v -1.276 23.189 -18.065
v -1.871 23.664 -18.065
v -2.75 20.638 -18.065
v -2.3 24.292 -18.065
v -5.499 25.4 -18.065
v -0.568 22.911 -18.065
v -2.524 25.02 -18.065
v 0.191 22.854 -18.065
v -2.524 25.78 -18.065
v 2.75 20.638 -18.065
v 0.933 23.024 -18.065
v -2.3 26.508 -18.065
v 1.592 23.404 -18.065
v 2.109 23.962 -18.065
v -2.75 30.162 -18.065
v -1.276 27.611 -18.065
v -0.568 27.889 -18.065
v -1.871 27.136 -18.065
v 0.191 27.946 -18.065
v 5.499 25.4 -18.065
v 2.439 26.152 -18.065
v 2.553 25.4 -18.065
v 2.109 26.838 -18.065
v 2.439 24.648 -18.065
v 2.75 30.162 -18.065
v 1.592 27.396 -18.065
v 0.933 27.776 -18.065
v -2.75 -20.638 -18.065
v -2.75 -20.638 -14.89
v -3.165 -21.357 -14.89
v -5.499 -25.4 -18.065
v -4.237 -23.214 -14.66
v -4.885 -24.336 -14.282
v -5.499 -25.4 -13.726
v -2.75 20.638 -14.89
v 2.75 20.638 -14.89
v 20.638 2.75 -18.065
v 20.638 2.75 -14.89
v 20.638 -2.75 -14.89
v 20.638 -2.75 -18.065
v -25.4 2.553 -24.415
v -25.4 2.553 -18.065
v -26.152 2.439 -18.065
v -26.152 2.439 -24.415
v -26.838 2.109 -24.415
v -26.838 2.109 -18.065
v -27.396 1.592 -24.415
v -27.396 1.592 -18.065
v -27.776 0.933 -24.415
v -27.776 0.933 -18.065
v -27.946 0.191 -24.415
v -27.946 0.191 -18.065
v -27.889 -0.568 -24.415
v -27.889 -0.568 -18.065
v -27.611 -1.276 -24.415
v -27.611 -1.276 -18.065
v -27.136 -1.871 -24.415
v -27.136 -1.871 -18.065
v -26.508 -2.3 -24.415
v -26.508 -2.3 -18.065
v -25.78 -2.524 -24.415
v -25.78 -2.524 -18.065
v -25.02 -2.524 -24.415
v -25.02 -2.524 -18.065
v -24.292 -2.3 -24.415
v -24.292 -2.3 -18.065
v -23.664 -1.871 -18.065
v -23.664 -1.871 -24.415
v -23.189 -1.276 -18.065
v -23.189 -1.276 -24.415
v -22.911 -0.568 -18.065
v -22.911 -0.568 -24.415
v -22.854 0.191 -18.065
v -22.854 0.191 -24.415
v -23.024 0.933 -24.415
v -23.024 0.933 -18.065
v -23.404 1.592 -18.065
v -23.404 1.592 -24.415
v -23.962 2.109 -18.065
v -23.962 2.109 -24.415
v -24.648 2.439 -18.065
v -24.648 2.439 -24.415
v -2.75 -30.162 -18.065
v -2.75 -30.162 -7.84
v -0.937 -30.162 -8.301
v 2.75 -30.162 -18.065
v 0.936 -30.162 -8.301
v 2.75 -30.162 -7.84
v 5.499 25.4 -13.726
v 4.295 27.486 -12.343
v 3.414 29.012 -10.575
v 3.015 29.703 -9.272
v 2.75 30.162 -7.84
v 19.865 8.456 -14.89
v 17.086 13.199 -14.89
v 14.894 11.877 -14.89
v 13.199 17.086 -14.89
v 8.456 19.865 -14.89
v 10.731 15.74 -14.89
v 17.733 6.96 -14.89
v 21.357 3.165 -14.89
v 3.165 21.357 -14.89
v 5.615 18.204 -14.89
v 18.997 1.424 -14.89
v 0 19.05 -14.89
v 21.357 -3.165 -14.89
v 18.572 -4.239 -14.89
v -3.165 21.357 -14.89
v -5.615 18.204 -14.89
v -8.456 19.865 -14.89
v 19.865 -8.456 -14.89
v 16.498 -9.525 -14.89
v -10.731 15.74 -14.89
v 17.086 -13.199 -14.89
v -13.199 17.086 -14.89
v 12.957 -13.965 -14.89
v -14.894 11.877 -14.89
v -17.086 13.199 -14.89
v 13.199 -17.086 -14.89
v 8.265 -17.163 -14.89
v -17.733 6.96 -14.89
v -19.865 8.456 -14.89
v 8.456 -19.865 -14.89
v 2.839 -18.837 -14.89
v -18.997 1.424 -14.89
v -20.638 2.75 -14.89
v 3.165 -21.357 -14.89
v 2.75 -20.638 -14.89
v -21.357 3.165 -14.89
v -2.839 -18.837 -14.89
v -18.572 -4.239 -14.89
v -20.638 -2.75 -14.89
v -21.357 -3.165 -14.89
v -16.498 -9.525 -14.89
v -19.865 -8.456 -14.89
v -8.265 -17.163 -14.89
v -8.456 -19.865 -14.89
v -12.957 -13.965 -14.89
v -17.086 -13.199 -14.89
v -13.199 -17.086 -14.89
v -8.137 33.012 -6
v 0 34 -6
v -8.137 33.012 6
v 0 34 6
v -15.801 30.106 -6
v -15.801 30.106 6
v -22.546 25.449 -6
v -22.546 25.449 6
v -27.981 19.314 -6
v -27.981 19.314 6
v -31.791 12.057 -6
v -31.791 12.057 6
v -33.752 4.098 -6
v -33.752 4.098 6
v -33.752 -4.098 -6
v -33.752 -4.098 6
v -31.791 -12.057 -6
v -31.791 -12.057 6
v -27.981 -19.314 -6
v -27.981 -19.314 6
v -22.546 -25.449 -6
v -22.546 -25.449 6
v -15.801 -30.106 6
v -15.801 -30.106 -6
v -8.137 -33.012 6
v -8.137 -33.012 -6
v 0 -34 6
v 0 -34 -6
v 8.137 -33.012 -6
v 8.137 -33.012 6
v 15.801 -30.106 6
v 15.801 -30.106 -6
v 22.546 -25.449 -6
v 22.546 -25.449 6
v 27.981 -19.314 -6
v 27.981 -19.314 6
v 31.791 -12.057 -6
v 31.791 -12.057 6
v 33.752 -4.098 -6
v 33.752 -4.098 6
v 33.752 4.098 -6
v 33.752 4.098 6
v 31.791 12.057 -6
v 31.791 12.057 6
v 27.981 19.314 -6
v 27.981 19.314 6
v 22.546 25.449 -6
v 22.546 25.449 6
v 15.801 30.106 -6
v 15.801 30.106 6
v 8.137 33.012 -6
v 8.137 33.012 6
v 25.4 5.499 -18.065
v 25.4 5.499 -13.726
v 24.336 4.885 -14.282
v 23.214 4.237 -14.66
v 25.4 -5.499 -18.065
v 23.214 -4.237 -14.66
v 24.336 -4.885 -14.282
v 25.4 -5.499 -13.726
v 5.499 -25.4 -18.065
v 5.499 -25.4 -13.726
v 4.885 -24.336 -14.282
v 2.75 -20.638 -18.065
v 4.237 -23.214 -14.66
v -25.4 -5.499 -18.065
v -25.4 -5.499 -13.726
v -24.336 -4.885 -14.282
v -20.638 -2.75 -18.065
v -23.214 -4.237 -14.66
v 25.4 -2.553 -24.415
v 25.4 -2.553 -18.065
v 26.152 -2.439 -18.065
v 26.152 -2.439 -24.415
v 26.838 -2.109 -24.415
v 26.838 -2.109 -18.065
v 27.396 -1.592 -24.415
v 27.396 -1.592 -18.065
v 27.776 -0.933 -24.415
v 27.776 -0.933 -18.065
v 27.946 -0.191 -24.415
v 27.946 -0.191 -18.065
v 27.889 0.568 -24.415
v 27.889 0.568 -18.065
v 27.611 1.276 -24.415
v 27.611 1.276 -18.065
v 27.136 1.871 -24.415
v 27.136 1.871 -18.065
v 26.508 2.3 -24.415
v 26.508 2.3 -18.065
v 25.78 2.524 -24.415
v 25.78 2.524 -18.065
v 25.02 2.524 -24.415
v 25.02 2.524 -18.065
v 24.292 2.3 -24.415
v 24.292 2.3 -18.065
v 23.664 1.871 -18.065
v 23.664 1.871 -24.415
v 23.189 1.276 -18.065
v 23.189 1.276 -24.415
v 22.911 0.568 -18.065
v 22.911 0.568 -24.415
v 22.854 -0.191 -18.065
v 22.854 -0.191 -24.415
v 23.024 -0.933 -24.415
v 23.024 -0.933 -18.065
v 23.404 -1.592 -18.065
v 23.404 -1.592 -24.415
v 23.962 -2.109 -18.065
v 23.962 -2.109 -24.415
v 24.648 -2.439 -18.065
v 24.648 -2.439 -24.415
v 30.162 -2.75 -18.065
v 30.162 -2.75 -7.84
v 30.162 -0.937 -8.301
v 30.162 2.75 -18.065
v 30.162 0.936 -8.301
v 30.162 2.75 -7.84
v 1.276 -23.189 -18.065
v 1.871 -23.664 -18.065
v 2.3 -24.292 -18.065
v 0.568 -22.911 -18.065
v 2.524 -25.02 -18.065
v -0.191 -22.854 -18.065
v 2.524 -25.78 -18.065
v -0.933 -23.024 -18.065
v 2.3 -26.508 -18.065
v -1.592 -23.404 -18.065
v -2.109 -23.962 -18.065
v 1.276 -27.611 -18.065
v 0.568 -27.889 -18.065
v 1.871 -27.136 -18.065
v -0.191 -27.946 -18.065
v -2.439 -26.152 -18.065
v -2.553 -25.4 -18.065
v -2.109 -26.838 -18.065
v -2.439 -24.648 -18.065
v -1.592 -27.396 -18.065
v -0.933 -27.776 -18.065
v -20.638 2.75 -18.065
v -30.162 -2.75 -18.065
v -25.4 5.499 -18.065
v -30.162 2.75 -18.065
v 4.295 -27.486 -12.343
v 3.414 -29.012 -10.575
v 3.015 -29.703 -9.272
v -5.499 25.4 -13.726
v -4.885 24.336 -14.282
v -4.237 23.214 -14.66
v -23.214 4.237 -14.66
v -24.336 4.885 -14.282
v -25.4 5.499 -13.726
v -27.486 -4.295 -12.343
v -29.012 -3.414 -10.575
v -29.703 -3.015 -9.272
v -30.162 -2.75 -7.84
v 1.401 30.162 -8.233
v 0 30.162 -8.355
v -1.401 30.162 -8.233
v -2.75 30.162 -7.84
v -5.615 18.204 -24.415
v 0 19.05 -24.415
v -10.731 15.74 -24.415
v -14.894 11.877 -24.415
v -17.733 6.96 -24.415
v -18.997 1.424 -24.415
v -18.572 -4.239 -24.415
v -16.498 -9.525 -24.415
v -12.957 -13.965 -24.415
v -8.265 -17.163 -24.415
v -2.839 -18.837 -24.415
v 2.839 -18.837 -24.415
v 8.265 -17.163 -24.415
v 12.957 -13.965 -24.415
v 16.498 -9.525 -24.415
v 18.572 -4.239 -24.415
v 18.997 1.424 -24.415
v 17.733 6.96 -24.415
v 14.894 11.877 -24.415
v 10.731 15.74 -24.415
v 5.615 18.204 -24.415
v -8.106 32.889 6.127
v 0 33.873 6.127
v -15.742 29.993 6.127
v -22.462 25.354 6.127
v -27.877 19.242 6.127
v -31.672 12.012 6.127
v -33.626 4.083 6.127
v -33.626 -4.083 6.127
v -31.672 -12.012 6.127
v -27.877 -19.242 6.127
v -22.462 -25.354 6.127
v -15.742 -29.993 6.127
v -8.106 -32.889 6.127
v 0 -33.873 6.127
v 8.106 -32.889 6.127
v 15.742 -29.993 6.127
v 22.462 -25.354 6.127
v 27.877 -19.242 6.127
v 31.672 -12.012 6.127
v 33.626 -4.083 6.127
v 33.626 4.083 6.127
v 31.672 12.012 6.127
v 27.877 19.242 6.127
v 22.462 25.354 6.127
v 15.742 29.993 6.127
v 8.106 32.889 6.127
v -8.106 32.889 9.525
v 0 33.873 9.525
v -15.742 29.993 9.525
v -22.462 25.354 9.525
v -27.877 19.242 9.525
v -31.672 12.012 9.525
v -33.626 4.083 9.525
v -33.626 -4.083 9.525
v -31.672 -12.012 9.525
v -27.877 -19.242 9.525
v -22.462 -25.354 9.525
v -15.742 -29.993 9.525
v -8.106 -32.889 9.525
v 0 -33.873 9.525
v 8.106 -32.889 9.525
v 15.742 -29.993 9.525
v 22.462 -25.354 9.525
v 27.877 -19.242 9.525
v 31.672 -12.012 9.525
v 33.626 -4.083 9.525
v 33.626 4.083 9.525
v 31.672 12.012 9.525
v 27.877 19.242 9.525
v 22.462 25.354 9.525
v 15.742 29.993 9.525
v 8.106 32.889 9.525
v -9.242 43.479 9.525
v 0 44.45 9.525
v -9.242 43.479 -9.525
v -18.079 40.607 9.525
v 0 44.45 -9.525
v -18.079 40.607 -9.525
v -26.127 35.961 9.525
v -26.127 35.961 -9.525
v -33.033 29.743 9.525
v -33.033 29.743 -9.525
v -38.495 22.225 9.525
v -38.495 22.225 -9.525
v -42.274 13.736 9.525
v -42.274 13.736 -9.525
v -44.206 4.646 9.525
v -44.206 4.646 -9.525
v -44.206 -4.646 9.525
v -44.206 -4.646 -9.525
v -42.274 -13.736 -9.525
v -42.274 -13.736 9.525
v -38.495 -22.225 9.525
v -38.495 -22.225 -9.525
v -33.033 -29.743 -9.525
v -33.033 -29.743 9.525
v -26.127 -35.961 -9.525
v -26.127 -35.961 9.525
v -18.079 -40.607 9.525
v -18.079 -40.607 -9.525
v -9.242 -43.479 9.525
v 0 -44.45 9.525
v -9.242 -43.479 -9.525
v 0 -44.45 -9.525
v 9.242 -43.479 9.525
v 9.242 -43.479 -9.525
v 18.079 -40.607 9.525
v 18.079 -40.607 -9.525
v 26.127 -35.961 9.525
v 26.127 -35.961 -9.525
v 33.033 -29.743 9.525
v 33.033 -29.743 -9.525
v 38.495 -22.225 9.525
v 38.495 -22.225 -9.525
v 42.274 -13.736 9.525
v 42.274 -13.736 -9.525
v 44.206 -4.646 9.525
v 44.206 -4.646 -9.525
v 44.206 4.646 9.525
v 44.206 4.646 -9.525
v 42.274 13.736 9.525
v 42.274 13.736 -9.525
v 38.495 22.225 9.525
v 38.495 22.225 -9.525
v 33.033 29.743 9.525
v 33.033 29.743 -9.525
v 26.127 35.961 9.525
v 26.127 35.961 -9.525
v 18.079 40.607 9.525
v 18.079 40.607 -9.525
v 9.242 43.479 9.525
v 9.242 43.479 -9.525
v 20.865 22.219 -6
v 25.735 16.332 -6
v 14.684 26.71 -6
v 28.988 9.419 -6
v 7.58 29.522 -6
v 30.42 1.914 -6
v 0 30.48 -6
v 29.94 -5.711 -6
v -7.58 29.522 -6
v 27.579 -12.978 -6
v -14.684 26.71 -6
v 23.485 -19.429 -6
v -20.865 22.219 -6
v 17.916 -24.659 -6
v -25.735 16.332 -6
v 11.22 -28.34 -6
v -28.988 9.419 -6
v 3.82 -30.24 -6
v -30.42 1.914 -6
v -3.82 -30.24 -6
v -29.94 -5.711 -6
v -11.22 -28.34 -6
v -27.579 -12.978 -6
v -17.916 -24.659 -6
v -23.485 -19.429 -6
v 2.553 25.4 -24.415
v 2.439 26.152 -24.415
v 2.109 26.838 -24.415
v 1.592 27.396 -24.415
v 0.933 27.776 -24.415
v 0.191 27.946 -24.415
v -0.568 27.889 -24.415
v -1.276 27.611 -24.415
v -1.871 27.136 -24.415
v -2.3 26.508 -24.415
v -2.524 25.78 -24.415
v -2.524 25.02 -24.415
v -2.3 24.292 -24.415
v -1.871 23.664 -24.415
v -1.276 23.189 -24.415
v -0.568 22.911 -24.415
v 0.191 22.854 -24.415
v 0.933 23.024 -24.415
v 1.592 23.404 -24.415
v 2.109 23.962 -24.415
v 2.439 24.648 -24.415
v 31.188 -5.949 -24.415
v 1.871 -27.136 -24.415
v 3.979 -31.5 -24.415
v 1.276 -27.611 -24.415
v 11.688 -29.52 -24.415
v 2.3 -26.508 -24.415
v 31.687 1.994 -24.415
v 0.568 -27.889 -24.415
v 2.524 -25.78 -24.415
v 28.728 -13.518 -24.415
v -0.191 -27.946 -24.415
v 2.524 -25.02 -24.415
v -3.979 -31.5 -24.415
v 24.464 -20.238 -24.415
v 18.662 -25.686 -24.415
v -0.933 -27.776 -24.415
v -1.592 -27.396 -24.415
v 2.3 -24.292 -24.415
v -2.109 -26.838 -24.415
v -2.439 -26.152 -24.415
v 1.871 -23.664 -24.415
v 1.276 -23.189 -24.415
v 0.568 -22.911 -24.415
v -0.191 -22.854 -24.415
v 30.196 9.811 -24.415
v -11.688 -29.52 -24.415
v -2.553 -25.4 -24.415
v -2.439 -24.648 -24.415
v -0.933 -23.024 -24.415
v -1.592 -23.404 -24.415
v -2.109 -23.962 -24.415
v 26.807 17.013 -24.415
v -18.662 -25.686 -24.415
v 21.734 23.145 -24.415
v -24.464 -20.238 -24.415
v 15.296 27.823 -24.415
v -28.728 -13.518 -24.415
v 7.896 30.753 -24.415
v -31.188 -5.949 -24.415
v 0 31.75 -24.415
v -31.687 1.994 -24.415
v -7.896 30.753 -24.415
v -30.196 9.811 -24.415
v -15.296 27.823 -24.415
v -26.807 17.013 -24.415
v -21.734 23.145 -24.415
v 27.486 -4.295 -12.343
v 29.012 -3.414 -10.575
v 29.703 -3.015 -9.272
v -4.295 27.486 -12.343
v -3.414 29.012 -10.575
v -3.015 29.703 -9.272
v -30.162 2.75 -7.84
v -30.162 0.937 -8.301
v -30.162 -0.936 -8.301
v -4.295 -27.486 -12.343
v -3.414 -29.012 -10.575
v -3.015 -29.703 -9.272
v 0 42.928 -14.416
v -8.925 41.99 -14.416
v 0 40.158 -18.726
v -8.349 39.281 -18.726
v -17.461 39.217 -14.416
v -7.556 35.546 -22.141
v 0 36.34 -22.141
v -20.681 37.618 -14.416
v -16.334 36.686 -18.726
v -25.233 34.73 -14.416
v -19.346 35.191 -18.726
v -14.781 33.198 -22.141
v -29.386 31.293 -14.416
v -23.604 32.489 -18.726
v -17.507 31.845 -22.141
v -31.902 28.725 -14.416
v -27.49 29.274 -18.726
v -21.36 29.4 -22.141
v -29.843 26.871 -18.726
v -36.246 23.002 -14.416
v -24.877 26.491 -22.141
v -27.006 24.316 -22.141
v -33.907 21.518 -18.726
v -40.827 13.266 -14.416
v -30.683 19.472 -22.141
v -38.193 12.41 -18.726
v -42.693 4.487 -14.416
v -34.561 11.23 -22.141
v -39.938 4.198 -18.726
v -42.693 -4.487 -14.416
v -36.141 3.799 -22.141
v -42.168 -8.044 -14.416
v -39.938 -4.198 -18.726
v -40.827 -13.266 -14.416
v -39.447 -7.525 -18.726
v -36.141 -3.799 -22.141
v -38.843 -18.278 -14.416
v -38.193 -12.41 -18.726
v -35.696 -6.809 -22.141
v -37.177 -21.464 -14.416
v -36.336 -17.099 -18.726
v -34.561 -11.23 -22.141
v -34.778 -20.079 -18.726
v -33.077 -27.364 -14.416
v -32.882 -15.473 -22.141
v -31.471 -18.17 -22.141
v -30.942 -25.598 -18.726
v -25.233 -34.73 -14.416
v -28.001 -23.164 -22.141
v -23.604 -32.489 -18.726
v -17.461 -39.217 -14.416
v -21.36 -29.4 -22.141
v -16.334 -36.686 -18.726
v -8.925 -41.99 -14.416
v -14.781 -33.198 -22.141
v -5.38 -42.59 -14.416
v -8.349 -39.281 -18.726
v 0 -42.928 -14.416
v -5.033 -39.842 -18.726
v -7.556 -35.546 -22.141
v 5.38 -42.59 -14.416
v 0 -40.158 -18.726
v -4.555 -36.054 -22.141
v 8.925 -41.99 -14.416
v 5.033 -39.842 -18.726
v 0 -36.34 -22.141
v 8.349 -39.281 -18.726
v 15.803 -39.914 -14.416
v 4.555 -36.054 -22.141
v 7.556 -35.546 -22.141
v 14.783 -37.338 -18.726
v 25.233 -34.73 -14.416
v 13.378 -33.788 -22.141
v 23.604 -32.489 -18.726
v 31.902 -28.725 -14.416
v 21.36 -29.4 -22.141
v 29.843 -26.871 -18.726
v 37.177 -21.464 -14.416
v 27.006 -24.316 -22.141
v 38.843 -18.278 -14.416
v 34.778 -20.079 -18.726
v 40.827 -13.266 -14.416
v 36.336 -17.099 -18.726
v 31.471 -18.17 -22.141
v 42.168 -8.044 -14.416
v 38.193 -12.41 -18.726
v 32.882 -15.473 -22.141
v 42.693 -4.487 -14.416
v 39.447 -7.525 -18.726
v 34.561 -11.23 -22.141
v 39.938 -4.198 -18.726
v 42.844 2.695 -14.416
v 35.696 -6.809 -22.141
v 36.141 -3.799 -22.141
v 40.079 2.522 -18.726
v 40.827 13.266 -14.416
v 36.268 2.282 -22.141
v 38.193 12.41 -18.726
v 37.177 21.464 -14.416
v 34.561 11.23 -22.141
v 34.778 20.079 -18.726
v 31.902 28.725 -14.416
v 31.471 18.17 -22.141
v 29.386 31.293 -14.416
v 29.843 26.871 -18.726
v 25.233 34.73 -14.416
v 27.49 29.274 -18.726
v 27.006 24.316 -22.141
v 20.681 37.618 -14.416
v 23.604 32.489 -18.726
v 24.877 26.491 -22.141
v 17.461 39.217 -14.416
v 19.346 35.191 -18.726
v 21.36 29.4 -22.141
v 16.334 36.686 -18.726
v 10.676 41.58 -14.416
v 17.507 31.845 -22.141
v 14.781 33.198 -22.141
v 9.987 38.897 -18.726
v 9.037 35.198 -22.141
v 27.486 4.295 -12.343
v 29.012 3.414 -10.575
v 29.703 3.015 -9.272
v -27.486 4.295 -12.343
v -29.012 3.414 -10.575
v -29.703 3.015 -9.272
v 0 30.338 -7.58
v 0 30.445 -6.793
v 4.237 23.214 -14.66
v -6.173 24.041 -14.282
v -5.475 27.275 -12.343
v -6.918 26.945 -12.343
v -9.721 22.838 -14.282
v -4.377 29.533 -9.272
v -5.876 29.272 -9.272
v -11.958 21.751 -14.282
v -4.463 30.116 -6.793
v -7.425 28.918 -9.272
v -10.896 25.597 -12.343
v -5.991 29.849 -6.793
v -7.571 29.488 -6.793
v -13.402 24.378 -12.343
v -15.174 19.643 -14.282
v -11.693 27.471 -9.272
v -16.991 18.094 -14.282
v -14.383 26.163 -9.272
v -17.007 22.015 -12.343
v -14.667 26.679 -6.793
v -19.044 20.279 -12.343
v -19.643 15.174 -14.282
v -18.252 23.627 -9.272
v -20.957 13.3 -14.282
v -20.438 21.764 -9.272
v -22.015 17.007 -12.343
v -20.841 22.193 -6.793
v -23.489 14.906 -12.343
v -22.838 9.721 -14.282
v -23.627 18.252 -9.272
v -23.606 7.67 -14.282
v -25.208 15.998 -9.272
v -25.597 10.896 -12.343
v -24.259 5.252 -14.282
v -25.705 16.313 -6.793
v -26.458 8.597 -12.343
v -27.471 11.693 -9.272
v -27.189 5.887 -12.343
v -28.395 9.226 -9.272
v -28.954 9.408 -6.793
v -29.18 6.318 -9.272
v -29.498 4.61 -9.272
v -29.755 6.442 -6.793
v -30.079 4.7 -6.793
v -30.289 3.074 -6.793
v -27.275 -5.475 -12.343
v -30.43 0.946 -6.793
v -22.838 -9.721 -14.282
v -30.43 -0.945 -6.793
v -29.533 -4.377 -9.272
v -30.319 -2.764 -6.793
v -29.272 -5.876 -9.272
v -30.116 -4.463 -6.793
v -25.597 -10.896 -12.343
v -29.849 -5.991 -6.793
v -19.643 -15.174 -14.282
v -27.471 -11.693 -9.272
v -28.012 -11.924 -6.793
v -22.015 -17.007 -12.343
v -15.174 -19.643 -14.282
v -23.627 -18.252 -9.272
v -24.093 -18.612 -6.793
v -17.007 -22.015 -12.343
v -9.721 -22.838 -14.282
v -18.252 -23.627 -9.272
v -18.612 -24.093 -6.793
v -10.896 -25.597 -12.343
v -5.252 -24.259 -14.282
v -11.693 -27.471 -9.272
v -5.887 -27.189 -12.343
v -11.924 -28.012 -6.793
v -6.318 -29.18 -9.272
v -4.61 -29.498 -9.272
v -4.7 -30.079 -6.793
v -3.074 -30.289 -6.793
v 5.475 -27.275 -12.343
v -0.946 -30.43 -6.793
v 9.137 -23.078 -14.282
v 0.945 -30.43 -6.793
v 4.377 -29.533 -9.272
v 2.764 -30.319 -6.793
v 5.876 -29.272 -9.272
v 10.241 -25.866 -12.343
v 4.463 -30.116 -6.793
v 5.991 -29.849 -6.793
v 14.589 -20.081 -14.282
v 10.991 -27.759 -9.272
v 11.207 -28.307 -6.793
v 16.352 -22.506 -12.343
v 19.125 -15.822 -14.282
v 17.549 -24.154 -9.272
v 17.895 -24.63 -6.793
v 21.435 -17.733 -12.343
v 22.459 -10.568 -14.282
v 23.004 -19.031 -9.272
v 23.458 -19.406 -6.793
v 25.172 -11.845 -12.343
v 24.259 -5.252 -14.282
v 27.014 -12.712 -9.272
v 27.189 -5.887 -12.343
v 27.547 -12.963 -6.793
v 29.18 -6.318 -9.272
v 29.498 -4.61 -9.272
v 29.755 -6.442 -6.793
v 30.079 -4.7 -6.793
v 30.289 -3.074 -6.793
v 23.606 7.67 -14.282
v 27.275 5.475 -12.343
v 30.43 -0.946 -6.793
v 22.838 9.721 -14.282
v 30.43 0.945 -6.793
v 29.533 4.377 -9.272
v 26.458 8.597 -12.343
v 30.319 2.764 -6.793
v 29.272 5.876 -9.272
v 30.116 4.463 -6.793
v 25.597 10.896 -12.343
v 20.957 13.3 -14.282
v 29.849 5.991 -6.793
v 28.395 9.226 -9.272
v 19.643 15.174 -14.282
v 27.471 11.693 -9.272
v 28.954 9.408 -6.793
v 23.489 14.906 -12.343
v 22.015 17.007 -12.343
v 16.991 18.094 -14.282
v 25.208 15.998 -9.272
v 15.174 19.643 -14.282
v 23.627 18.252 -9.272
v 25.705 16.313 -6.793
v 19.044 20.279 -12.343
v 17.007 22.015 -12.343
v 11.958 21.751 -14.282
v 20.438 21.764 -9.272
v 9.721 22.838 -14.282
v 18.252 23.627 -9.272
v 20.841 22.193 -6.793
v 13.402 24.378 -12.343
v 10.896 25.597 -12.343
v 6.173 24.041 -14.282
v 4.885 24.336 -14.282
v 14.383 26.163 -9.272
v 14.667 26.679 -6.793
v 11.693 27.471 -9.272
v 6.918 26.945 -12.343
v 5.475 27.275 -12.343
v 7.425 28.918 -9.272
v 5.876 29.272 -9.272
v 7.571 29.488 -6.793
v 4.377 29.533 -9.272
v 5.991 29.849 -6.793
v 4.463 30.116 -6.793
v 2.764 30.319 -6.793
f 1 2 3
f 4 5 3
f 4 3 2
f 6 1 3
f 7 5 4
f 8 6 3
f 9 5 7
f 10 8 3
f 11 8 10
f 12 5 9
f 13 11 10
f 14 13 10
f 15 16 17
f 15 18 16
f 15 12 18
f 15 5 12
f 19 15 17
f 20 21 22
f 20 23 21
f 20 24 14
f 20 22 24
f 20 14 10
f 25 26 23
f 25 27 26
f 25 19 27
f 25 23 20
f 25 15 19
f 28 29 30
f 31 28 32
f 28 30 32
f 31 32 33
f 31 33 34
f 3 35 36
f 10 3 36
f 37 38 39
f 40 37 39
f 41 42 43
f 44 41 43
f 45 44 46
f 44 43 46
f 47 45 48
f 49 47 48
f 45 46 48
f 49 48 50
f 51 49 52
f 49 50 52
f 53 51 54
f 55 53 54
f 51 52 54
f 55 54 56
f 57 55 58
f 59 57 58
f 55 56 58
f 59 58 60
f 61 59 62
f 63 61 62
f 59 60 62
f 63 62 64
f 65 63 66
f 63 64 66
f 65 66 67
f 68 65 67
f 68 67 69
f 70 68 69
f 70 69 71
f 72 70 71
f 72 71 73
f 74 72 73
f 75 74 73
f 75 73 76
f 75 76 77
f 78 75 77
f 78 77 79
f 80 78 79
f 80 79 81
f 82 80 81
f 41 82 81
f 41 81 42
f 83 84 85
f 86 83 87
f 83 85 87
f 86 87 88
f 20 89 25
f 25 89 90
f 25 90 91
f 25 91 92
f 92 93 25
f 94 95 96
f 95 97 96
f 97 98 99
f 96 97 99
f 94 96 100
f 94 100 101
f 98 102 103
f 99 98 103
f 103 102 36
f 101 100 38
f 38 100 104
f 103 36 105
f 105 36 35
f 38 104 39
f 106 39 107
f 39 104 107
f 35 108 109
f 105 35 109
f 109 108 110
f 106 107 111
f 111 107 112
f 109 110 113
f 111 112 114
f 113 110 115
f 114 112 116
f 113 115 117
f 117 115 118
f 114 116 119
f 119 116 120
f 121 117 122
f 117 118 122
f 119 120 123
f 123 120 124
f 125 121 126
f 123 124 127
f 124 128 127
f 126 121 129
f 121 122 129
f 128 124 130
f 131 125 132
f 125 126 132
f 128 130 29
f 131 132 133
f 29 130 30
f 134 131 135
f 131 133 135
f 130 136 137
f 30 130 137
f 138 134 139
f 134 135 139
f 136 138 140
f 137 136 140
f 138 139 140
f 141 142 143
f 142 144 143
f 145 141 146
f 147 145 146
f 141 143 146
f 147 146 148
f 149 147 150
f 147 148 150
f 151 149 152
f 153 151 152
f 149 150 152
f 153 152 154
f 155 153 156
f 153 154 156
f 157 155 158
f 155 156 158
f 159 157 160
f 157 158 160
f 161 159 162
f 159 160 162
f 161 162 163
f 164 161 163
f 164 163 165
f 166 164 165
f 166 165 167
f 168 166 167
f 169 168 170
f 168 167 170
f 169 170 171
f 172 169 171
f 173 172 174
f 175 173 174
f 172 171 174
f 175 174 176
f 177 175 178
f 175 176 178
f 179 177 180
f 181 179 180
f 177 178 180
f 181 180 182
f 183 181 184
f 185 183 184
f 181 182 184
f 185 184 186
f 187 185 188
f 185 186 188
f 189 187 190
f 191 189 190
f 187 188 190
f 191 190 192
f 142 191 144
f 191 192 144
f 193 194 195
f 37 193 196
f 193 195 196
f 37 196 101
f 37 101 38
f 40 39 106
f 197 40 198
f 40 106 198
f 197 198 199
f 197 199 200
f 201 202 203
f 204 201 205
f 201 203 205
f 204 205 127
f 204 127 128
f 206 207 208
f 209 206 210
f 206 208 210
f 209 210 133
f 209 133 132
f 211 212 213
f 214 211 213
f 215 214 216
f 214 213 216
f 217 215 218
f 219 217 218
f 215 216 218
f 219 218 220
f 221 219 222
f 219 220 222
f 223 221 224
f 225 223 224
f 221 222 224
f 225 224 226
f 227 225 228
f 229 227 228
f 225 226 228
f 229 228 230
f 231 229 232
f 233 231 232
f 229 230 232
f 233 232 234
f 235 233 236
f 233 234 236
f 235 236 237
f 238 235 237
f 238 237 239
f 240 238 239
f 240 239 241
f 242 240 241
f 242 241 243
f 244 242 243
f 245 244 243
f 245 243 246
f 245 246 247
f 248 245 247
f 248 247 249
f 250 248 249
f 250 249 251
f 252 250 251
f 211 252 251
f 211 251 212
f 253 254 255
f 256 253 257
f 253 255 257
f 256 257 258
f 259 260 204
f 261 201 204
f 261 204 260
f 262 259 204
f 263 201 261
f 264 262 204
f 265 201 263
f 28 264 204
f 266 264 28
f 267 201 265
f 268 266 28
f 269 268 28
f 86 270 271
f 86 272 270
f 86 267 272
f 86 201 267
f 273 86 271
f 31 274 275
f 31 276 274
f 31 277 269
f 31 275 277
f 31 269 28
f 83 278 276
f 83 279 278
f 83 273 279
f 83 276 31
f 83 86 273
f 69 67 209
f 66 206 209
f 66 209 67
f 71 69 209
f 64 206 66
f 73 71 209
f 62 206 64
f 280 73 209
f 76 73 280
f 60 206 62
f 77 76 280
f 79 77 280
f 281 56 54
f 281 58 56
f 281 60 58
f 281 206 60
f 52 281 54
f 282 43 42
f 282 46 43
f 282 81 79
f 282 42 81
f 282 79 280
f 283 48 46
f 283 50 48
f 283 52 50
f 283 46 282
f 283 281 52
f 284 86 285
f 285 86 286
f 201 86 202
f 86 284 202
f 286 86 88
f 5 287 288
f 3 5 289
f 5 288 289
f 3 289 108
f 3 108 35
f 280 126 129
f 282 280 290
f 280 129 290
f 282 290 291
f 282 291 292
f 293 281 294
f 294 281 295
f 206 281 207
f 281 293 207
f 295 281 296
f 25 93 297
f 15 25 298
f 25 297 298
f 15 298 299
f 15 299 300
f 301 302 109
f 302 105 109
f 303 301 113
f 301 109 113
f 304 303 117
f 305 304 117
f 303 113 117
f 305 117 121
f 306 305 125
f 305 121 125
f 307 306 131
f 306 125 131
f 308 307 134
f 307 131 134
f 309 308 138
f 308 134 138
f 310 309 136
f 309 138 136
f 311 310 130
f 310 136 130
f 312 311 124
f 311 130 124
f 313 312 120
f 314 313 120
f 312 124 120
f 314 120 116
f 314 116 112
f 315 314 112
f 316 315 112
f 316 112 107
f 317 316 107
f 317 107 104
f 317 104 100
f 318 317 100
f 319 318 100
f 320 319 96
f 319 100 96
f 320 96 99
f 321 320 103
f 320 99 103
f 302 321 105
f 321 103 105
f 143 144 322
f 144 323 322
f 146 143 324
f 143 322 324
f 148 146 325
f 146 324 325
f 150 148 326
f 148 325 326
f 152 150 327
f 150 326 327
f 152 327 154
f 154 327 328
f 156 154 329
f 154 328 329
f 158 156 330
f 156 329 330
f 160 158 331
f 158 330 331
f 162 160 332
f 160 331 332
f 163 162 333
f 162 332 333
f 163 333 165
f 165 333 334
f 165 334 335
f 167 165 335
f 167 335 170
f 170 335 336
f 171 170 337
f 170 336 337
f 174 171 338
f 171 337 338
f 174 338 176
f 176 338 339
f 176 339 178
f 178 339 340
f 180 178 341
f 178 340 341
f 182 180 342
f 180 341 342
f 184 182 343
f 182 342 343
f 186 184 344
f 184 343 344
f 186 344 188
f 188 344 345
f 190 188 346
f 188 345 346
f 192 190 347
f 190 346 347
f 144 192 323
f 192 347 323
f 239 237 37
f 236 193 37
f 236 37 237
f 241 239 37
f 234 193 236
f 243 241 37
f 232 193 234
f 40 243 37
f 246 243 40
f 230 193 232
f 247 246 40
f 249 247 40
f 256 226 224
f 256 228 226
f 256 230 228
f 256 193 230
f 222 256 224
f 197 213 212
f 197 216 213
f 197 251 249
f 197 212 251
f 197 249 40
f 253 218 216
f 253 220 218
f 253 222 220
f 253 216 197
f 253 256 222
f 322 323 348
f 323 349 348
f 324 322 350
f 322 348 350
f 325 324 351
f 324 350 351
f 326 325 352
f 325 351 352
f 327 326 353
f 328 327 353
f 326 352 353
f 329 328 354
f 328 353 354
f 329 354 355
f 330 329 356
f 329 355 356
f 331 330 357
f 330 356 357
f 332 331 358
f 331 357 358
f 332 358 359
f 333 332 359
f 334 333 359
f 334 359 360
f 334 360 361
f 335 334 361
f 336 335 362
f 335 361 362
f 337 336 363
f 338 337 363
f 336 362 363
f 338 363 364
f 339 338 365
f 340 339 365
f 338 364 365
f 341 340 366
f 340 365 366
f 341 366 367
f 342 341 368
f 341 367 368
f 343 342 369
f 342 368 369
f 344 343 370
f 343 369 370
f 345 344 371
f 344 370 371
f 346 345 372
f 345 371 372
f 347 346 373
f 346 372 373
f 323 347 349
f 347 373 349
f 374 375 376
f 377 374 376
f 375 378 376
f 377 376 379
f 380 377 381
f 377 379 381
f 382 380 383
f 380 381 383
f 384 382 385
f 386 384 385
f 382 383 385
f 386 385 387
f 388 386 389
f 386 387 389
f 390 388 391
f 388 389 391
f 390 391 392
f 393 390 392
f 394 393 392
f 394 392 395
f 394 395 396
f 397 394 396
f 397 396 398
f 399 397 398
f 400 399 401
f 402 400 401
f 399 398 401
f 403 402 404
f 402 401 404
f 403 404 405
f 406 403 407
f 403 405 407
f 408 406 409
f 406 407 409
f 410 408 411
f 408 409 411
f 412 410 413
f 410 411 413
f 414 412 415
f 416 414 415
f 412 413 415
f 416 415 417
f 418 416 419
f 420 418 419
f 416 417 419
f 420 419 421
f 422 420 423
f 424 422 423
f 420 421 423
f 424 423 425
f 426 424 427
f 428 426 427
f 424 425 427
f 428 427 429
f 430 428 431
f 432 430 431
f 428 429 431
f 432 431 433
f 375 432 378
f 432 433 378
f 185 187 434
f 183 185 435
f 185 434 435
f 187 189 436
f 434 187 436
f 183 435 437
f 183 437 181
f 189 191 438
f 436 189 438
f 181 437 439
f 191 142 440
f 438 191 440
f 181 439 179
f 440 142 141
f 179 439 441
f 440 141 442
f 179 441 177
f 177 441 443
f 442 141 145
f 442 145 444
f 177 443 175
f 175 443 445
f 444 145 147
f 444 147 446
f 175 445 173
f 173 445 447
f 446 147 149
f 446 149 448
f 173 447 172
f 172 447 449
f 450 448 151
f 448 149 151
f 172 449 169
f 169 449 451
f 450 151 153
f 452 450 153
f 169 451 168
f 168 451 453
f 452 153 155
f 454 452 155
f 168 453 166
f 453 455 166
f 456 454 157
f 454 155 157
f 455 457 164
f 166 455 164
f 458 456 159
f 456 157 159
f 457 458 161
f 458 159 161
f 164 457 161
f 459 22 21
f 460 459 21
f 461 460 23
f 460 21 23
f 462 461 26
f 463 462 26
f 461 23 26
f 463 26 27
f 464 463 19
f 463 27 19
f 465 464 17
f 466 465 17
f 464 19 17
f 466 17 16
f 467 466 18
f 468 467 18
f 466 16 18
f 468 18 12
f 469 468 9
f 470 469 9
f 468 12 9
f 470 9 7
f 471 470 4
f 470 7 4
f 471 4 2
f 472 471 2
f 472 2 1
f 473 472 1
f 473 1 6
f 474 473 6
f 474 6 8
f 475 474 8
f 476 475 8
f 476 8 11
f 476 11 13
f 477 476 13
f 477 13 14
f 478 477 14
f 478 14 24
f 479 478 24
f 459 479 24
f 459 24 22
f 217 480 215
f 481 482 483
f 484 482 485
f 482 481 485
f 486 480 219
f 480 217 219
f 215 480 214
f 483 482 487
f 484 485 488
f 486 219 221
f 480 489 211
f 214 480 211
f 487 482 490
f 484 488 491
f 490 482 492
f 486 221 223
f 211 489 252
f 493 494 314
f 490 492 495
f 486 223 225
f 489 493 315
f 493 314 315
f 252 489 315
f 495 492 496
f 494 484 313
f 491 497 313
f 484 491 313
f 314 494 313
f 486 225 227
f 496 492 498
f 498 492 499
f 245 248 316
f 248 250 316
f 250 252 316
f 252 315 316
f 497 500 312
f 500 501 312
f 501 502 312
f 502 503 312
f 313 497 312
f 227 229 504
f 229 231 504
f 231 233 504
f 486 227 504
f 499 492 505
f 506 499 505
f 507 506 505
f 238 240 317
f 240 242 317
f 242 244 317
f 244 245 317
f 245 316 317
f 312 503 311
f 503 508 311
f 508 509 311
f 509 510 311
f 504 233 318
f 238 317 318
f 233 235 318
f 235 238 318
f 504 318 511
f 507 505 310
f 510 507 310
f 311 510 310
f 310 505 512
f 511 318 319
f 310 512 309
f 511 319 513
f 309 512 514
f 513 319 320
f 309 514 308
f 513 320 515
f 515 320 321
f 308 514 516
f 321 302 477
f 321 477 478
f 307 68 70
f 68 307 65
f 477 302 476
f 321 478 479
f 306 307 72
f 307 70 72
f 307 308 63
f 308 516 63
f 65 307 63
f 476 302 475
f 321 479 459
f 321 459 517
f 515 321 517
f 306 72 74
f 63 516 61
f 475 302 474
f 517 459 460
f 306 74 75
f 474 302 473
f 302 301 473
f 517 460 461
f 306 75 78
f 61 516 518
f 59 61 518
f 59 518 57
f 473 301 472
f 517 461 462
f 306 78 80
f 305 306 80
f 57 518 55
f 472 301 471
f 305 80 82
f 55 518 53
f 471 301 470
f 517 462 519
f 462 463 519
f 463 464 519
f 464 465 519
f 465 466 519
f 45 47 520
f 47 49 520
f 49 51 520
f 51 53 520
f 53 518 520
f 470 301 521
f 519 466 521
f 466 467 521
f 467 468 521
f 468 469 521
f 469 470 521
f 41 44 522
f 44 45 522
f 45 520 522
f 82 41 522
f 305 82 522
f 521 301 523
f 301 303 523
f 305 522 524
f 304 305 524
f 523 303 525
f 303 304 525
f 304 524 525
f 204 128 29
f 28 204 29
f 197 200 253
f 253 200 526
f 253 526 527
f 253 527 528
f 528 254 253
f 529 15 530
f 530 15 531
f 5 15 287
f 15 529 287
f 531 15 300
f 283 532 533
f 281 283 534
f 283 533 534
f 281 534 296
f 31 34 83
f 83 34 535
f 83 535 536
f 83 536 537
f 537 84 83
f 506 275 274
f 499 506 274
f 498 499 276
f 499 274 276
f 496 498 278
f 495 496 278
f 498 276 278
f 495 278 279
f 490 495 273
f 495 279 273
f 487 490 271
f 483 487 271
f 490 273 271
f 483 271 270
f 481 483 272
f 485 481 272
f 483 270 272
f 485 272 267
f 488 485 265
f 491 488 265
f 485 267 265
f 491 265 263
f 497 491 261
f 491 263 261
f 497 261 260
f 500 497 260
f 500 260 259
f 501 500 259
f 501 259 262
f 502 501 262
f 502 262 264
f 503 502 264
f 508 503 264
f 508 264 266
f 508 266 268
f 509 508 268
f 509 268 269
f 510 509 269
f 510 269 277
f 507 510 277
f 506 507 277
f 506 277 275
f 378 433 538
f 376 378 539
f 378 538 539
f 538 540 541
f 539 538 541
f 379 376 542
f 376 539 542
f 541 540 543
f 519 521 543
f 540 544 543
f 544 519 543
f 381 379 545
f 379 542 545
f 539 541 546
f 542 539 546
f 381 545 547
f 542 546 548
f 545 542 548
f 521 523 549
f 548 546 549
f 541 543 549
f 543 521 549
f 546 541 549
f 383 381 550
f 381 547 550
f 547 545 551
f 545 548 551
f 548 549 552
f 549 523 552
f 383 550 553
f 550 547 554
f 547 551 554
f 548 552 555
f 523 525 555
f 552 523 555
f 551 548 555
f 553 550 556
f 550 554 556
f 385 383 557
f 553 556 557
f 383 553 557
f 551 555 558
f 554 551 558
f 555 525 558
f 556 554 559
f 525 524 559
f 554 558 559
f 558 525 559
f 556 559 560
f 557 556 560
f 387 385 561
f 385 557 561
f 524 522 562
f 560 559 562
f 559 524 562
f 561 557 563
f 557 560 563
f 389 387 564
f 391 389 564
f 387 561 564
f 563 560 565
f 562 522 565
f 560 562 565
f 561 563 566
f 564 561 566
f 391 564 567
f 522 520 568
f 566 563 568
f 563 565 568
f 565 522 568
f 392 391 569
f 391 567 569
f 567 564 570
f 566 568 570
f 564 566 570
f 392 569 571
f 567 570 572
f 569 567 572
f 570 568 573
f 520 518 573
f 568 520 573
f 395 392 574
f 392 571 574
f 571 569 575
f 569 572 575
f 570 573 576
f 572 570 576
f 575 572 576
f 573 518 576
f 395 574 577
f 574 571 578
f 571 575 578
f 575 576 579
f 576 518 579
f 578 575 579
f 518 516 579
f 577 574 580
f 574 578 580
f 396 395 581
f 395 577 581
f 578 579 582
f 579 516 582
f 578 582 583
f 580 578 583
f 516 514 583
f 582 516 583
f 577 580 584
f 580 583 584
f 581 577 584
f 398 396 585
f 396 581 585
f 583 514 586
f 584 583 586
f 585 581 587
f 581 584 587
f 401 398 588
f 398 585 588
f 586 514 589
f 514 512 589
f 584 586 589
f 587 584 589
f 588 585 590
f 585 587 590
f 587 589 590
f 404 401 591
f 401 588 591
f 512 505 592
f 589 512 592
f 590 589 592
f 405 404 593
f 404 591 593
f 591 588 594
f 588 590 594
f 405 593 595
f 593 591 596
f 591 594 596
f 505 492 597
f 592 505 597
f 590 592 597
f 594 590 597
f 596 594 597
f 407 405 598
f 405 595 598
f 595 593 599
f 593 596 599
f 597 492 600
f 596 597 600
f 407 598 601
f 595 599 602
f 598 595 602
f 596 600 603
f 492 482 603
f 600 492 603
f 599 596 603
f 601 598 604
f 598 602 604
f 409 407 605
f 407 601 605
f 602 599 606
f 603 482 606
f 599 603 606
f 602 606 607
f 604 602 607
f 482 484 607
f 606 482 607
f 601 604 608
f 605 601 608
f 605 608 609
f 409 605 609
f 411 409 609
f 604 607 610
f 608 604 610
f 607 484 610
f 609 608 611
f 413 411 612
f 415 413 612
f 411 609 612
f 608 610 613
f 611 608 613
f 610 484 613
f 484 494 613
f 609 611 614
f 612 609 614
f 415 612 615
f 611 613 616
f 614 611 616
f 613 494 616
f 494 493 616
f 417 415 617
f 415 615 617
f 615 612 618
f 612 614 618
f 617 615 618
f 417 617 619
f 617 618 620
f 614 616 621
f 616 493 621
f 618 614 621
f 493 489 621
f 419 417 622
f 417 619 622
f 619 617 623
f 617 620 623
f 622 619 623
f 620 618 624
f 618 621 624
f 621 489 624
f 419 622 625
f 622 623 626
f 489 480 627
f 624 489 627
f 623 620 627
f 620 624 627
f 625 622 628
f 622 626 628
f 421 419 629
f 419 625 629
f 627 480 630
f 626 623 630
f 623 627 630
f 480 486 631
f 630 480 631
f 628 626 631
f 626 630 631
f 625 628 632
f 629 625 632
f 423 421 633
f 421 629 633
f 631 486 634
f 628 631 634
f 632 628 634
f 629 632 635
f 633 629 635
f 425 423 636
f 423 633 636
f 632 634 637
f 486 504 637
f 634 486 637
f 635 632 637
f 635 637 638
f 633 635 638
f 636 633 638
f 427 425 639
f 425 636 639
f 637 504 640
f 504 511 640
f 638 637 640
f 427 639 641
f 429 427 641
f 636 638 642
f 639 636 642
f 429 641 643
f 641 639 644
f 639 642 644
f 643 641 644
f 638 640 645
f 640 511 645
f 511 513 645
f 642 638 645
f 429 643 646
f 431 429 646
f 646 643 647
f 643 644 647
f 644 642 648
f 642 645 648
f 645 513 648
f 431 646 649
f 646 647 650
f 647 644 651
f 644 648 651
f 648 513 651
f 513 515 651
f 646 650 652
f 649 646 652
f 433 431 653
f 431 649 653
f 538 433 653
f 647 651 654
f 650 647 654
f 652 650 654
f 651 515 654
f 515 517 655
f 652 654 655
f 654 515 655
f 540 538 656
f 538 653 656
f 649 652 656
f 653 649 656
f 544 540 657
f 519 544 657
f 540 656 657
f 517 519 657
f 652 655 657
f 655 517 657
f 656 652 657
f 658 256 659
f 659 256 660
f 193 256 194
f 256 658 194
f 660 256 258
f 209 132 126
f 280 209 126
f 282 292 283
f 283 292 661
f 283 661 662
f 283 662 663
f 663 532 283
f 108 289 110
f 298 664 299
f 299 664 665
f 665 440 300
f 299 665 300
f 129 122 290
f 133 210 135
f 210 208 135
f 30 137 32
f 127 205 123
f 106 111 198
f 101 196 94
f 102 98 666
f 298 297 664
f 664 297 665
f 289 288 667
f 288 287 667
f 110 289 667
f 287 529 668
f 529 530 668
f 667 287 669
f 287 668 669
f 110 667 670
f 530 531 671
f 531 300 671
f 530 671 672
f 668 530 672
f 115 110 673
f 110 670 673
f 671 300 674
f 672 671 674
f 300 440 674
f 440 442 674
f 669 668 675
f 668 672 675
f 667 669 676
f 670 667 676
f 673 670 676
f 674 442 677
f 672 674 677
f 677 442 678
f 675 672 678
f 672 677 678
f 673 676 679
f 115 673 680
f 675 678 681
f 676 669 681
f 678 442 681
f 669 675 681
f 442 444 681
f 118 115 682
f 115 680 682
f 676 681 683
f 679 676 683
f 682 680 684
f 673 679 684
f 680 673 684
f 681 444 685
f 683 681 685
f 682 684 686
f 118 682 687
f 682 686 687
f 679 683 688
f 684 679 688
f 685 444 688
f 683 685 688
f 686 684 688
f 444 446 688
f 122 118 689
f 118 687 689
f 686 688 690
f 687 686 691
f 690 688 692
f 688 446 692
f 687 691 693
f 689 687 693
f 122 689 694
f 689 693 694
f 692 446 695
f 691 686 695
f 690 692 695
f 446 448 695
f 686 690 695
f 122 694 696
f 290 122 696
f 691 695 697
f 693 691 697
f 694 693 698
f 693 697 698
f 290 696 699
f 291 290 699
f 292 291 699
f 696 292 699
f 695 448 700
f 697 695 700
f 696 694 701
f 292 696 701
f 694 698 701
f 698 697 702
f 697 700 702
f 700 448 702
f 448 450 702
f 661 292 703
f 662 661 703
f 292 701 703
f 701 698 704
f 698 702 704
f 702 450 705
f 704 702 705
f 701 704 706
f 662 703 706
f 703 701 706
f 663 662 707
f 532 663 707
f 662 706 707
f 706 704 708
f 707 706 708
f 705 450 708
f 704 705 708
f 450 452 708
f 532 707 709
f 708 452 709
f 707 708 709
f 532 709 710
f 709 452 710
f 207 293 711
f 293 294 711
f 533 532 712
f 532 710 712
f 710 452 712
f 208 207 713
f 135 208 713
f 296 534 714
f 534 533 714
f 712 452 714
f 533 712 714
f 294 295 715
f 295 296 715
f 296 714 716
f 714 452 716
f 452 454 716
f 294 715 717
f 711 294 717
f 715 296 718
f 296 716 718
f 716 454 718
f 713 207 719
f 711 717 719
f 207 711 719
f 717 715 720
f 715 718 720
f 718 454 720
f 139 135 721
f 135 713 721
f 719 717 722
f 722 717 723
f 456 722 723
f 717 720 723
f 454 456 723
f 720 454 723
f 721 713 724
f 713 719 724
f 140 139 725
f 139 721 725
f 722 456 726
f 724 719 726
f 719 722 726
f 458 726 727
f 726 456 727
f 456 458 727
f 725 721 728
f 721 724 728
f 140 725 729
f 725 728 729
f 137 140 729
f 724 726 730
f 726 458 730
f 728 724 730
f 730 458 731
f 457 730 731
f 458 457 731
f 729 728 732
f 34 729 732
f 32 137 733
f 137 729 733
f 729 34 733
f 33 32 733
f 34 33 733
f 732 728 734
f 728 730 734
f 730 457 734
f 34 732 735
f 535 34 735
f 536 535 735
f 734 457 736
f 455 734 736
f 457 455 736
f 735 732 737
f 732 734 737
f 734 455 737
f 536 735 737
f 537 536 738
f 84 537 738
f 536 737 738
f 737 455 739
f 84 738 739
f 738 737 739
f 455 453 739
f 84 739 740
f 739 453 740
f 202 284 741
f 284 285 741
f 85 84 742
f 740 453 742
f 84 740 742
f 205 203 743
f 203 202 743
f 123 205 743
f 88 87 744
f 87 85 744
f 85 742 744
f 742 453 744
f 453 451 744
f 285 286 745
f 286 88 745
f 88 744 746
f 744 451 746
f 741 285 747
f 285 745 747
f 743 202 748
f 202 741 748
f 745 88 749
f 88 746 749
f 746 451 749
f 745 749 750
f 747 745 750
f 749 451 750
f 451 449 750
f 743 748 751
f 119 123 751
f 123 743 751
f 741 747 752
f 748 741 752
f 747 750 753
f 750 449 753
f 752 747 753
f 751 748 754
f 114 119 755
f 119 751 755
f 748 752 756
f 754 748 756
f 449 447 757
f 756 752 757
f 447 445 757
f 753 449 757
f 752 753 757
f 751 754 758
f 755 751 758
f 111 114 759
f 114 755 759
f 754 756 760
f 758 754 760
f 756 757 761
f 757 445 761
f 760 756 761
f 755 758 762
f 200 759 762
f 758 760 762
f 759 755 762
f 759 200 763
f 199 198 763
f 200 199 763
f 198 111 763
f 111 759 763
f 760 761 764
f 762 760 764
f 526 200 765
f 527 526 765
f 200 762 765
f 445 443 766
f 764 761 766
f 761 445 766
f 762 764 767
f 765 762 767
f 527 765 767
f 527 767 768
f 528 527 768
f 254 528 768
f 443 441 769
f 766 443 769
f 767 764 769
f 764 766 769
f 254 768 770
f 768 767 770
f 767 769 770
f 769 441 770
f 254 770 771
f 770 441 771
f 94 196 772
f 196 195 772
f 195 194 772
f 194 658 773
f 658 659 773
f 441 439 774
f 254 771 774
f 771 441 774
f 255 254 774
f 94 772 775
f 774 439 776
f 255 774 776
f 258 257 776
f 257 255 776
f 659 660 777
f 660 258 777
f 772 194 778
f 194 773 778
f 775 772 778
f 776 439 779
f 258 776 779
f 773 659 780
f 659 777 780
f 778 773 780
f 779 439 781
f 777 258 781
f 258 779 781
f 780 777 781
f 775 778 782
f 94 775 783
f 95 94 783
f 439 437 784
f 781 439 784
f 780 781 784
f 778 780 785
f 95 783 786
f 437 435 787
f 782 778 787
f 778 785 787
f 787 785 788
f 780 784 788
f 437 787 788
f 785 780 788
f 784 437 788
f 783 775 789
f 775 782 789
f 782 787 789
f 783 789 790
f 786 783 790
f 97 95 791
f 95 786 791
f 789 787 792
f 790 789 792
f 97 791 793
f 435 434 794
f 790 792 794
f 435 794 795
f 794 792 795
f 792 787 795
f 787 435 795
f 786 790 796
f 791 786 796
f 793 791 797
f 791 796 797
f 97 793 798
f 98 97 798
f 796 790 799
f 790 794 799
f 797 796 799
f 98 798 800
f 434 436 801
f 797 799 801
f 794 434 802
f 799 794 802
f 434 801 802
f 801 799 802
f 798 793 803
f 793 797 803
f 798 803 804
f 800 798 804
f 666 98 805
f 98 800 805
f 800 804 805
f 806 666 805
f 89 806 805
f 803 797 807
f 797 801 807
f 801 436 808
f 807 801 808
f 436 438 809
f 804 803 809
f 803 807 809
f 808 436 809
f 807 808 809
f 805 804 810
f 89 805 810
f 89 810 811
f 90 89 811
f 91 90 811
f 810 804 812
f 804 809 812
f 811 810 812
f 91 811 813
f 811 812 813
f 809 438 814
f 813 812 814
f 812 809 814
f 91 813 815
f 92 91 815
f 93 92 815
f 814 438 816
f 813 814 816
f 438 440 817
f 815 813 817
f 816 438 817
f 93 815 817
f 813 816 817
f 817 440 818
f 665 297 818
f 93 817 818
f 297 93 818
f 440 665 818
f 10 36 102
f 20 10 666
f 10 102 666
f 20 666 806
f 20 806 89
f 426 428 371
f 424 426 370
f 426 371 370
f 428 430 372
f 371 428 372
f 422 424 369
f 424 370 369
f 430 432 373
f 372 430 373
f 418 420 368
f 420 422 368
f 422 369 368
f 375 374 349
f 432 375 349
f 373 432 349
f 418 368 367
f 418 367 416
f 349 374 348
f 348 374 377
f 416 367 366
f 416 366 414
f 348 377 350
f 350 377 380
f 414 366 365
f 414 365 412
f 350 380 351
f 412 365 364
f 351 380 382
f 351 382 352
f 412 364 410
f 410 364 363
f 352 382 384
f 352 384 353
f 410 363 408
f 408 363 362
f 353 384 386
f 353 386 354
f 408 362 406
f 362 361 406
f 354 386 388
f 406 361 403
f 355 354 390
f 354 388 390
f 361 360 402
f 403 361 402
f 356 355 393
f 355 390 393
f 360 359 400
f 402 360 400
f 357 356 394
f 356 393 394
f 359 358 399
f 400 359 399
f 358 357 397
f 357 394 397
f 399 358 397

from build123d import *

# Parameters (mm, degrees)
CUT_EXTRUDE1_DEPTH = 12.065
SKETCH4_R          = 2.5527
CUT_EXTRUDE2_DEPTH = 7.35
CIRPATTERN1_COUNT  = 4


with BuildPart() as part:
    # Sketch2 → Revolve1 (revolve)
    with BuildSketch(Plane(origin=(0, 0, 0), x_dir=(0, 0, -1), z_dir=(1, 0, 0))):
        with BuildLine():
            Line((6, 34), (-6, 34))
            Line((-6, 34), (-6.127, 33.873))
            Line((-6.127, 33.873), (-9.525, 33.873))
            Line((-9.525, 33.873), (-9.525, 44.45))
            Line((-9.525, 44.45), (9.525, 44.45))
            ThreePointArc((9.525, 44.45), (18.725516989, 40.158239998), (24.415, 31.75))
            Line((24.415, 31.75), (24.415, 19.05))
            Line((24.415, 19.05), (14.89, 19.05))
            Line((14.89, 19.05), (14.89, 21.59))
            ThreePointArc((14.89, 21.59), (12.286179285, 27.876179285), (6, 30.48))
            Line((6, 30.48), (6, 34))
        make_face()
    revolve(axis=Axis((0, 0, 0), (0, 0, 1)))

    # Sketch3 → Cut-Extrude1 (cut)
    with BuildSketch(Plane.XY.offset(-6)):
        Polygon((5.499261314, 25.4), (2.749630657, 30.1625), (-2.749630657, 30.1625), (-5.499261314, 25.4), (-2.749630657, 20.6375), (2.749630657, 20.6375), align=None)
    cut_extrude1 = extrude(amount=-CUT_EXTRUDE1_DEPTH, mode=Mode.SUBTRACT)

    # Sketch4 → Cut-Extrude2 (cut, through all)
    with BuildSketch(Plane.XY.offset(-18.065)):
        with Locations((0, 25.4)):
            Circle(SKETCH4_R)
    cut_extrude2 = extrude(amount=-CUT_EXTRUDE2_DEPTH, mode=Mode.SUBTRACT)

    # CirPattern1: Cut-Extrude1, Cut-Extrude2 ×4 about axis
    cirpattern1_axis = Axis((0, 0, 0), (0, 0, 1))
    for i in range(1, CIRPATTERN1_COUNT):
        add(cut_extrude1.rotate(cirpattern1_axis, i * 360 / CIRPATTERN1_COUNT), mode=Mode.SUBTRACT)
        add(cut_extrude2.rotate(cirpattern1_axis, i * 360 / CIRPATTERN1_COUNT), mode=Mode.SUBTRACT)


solid = part.part
